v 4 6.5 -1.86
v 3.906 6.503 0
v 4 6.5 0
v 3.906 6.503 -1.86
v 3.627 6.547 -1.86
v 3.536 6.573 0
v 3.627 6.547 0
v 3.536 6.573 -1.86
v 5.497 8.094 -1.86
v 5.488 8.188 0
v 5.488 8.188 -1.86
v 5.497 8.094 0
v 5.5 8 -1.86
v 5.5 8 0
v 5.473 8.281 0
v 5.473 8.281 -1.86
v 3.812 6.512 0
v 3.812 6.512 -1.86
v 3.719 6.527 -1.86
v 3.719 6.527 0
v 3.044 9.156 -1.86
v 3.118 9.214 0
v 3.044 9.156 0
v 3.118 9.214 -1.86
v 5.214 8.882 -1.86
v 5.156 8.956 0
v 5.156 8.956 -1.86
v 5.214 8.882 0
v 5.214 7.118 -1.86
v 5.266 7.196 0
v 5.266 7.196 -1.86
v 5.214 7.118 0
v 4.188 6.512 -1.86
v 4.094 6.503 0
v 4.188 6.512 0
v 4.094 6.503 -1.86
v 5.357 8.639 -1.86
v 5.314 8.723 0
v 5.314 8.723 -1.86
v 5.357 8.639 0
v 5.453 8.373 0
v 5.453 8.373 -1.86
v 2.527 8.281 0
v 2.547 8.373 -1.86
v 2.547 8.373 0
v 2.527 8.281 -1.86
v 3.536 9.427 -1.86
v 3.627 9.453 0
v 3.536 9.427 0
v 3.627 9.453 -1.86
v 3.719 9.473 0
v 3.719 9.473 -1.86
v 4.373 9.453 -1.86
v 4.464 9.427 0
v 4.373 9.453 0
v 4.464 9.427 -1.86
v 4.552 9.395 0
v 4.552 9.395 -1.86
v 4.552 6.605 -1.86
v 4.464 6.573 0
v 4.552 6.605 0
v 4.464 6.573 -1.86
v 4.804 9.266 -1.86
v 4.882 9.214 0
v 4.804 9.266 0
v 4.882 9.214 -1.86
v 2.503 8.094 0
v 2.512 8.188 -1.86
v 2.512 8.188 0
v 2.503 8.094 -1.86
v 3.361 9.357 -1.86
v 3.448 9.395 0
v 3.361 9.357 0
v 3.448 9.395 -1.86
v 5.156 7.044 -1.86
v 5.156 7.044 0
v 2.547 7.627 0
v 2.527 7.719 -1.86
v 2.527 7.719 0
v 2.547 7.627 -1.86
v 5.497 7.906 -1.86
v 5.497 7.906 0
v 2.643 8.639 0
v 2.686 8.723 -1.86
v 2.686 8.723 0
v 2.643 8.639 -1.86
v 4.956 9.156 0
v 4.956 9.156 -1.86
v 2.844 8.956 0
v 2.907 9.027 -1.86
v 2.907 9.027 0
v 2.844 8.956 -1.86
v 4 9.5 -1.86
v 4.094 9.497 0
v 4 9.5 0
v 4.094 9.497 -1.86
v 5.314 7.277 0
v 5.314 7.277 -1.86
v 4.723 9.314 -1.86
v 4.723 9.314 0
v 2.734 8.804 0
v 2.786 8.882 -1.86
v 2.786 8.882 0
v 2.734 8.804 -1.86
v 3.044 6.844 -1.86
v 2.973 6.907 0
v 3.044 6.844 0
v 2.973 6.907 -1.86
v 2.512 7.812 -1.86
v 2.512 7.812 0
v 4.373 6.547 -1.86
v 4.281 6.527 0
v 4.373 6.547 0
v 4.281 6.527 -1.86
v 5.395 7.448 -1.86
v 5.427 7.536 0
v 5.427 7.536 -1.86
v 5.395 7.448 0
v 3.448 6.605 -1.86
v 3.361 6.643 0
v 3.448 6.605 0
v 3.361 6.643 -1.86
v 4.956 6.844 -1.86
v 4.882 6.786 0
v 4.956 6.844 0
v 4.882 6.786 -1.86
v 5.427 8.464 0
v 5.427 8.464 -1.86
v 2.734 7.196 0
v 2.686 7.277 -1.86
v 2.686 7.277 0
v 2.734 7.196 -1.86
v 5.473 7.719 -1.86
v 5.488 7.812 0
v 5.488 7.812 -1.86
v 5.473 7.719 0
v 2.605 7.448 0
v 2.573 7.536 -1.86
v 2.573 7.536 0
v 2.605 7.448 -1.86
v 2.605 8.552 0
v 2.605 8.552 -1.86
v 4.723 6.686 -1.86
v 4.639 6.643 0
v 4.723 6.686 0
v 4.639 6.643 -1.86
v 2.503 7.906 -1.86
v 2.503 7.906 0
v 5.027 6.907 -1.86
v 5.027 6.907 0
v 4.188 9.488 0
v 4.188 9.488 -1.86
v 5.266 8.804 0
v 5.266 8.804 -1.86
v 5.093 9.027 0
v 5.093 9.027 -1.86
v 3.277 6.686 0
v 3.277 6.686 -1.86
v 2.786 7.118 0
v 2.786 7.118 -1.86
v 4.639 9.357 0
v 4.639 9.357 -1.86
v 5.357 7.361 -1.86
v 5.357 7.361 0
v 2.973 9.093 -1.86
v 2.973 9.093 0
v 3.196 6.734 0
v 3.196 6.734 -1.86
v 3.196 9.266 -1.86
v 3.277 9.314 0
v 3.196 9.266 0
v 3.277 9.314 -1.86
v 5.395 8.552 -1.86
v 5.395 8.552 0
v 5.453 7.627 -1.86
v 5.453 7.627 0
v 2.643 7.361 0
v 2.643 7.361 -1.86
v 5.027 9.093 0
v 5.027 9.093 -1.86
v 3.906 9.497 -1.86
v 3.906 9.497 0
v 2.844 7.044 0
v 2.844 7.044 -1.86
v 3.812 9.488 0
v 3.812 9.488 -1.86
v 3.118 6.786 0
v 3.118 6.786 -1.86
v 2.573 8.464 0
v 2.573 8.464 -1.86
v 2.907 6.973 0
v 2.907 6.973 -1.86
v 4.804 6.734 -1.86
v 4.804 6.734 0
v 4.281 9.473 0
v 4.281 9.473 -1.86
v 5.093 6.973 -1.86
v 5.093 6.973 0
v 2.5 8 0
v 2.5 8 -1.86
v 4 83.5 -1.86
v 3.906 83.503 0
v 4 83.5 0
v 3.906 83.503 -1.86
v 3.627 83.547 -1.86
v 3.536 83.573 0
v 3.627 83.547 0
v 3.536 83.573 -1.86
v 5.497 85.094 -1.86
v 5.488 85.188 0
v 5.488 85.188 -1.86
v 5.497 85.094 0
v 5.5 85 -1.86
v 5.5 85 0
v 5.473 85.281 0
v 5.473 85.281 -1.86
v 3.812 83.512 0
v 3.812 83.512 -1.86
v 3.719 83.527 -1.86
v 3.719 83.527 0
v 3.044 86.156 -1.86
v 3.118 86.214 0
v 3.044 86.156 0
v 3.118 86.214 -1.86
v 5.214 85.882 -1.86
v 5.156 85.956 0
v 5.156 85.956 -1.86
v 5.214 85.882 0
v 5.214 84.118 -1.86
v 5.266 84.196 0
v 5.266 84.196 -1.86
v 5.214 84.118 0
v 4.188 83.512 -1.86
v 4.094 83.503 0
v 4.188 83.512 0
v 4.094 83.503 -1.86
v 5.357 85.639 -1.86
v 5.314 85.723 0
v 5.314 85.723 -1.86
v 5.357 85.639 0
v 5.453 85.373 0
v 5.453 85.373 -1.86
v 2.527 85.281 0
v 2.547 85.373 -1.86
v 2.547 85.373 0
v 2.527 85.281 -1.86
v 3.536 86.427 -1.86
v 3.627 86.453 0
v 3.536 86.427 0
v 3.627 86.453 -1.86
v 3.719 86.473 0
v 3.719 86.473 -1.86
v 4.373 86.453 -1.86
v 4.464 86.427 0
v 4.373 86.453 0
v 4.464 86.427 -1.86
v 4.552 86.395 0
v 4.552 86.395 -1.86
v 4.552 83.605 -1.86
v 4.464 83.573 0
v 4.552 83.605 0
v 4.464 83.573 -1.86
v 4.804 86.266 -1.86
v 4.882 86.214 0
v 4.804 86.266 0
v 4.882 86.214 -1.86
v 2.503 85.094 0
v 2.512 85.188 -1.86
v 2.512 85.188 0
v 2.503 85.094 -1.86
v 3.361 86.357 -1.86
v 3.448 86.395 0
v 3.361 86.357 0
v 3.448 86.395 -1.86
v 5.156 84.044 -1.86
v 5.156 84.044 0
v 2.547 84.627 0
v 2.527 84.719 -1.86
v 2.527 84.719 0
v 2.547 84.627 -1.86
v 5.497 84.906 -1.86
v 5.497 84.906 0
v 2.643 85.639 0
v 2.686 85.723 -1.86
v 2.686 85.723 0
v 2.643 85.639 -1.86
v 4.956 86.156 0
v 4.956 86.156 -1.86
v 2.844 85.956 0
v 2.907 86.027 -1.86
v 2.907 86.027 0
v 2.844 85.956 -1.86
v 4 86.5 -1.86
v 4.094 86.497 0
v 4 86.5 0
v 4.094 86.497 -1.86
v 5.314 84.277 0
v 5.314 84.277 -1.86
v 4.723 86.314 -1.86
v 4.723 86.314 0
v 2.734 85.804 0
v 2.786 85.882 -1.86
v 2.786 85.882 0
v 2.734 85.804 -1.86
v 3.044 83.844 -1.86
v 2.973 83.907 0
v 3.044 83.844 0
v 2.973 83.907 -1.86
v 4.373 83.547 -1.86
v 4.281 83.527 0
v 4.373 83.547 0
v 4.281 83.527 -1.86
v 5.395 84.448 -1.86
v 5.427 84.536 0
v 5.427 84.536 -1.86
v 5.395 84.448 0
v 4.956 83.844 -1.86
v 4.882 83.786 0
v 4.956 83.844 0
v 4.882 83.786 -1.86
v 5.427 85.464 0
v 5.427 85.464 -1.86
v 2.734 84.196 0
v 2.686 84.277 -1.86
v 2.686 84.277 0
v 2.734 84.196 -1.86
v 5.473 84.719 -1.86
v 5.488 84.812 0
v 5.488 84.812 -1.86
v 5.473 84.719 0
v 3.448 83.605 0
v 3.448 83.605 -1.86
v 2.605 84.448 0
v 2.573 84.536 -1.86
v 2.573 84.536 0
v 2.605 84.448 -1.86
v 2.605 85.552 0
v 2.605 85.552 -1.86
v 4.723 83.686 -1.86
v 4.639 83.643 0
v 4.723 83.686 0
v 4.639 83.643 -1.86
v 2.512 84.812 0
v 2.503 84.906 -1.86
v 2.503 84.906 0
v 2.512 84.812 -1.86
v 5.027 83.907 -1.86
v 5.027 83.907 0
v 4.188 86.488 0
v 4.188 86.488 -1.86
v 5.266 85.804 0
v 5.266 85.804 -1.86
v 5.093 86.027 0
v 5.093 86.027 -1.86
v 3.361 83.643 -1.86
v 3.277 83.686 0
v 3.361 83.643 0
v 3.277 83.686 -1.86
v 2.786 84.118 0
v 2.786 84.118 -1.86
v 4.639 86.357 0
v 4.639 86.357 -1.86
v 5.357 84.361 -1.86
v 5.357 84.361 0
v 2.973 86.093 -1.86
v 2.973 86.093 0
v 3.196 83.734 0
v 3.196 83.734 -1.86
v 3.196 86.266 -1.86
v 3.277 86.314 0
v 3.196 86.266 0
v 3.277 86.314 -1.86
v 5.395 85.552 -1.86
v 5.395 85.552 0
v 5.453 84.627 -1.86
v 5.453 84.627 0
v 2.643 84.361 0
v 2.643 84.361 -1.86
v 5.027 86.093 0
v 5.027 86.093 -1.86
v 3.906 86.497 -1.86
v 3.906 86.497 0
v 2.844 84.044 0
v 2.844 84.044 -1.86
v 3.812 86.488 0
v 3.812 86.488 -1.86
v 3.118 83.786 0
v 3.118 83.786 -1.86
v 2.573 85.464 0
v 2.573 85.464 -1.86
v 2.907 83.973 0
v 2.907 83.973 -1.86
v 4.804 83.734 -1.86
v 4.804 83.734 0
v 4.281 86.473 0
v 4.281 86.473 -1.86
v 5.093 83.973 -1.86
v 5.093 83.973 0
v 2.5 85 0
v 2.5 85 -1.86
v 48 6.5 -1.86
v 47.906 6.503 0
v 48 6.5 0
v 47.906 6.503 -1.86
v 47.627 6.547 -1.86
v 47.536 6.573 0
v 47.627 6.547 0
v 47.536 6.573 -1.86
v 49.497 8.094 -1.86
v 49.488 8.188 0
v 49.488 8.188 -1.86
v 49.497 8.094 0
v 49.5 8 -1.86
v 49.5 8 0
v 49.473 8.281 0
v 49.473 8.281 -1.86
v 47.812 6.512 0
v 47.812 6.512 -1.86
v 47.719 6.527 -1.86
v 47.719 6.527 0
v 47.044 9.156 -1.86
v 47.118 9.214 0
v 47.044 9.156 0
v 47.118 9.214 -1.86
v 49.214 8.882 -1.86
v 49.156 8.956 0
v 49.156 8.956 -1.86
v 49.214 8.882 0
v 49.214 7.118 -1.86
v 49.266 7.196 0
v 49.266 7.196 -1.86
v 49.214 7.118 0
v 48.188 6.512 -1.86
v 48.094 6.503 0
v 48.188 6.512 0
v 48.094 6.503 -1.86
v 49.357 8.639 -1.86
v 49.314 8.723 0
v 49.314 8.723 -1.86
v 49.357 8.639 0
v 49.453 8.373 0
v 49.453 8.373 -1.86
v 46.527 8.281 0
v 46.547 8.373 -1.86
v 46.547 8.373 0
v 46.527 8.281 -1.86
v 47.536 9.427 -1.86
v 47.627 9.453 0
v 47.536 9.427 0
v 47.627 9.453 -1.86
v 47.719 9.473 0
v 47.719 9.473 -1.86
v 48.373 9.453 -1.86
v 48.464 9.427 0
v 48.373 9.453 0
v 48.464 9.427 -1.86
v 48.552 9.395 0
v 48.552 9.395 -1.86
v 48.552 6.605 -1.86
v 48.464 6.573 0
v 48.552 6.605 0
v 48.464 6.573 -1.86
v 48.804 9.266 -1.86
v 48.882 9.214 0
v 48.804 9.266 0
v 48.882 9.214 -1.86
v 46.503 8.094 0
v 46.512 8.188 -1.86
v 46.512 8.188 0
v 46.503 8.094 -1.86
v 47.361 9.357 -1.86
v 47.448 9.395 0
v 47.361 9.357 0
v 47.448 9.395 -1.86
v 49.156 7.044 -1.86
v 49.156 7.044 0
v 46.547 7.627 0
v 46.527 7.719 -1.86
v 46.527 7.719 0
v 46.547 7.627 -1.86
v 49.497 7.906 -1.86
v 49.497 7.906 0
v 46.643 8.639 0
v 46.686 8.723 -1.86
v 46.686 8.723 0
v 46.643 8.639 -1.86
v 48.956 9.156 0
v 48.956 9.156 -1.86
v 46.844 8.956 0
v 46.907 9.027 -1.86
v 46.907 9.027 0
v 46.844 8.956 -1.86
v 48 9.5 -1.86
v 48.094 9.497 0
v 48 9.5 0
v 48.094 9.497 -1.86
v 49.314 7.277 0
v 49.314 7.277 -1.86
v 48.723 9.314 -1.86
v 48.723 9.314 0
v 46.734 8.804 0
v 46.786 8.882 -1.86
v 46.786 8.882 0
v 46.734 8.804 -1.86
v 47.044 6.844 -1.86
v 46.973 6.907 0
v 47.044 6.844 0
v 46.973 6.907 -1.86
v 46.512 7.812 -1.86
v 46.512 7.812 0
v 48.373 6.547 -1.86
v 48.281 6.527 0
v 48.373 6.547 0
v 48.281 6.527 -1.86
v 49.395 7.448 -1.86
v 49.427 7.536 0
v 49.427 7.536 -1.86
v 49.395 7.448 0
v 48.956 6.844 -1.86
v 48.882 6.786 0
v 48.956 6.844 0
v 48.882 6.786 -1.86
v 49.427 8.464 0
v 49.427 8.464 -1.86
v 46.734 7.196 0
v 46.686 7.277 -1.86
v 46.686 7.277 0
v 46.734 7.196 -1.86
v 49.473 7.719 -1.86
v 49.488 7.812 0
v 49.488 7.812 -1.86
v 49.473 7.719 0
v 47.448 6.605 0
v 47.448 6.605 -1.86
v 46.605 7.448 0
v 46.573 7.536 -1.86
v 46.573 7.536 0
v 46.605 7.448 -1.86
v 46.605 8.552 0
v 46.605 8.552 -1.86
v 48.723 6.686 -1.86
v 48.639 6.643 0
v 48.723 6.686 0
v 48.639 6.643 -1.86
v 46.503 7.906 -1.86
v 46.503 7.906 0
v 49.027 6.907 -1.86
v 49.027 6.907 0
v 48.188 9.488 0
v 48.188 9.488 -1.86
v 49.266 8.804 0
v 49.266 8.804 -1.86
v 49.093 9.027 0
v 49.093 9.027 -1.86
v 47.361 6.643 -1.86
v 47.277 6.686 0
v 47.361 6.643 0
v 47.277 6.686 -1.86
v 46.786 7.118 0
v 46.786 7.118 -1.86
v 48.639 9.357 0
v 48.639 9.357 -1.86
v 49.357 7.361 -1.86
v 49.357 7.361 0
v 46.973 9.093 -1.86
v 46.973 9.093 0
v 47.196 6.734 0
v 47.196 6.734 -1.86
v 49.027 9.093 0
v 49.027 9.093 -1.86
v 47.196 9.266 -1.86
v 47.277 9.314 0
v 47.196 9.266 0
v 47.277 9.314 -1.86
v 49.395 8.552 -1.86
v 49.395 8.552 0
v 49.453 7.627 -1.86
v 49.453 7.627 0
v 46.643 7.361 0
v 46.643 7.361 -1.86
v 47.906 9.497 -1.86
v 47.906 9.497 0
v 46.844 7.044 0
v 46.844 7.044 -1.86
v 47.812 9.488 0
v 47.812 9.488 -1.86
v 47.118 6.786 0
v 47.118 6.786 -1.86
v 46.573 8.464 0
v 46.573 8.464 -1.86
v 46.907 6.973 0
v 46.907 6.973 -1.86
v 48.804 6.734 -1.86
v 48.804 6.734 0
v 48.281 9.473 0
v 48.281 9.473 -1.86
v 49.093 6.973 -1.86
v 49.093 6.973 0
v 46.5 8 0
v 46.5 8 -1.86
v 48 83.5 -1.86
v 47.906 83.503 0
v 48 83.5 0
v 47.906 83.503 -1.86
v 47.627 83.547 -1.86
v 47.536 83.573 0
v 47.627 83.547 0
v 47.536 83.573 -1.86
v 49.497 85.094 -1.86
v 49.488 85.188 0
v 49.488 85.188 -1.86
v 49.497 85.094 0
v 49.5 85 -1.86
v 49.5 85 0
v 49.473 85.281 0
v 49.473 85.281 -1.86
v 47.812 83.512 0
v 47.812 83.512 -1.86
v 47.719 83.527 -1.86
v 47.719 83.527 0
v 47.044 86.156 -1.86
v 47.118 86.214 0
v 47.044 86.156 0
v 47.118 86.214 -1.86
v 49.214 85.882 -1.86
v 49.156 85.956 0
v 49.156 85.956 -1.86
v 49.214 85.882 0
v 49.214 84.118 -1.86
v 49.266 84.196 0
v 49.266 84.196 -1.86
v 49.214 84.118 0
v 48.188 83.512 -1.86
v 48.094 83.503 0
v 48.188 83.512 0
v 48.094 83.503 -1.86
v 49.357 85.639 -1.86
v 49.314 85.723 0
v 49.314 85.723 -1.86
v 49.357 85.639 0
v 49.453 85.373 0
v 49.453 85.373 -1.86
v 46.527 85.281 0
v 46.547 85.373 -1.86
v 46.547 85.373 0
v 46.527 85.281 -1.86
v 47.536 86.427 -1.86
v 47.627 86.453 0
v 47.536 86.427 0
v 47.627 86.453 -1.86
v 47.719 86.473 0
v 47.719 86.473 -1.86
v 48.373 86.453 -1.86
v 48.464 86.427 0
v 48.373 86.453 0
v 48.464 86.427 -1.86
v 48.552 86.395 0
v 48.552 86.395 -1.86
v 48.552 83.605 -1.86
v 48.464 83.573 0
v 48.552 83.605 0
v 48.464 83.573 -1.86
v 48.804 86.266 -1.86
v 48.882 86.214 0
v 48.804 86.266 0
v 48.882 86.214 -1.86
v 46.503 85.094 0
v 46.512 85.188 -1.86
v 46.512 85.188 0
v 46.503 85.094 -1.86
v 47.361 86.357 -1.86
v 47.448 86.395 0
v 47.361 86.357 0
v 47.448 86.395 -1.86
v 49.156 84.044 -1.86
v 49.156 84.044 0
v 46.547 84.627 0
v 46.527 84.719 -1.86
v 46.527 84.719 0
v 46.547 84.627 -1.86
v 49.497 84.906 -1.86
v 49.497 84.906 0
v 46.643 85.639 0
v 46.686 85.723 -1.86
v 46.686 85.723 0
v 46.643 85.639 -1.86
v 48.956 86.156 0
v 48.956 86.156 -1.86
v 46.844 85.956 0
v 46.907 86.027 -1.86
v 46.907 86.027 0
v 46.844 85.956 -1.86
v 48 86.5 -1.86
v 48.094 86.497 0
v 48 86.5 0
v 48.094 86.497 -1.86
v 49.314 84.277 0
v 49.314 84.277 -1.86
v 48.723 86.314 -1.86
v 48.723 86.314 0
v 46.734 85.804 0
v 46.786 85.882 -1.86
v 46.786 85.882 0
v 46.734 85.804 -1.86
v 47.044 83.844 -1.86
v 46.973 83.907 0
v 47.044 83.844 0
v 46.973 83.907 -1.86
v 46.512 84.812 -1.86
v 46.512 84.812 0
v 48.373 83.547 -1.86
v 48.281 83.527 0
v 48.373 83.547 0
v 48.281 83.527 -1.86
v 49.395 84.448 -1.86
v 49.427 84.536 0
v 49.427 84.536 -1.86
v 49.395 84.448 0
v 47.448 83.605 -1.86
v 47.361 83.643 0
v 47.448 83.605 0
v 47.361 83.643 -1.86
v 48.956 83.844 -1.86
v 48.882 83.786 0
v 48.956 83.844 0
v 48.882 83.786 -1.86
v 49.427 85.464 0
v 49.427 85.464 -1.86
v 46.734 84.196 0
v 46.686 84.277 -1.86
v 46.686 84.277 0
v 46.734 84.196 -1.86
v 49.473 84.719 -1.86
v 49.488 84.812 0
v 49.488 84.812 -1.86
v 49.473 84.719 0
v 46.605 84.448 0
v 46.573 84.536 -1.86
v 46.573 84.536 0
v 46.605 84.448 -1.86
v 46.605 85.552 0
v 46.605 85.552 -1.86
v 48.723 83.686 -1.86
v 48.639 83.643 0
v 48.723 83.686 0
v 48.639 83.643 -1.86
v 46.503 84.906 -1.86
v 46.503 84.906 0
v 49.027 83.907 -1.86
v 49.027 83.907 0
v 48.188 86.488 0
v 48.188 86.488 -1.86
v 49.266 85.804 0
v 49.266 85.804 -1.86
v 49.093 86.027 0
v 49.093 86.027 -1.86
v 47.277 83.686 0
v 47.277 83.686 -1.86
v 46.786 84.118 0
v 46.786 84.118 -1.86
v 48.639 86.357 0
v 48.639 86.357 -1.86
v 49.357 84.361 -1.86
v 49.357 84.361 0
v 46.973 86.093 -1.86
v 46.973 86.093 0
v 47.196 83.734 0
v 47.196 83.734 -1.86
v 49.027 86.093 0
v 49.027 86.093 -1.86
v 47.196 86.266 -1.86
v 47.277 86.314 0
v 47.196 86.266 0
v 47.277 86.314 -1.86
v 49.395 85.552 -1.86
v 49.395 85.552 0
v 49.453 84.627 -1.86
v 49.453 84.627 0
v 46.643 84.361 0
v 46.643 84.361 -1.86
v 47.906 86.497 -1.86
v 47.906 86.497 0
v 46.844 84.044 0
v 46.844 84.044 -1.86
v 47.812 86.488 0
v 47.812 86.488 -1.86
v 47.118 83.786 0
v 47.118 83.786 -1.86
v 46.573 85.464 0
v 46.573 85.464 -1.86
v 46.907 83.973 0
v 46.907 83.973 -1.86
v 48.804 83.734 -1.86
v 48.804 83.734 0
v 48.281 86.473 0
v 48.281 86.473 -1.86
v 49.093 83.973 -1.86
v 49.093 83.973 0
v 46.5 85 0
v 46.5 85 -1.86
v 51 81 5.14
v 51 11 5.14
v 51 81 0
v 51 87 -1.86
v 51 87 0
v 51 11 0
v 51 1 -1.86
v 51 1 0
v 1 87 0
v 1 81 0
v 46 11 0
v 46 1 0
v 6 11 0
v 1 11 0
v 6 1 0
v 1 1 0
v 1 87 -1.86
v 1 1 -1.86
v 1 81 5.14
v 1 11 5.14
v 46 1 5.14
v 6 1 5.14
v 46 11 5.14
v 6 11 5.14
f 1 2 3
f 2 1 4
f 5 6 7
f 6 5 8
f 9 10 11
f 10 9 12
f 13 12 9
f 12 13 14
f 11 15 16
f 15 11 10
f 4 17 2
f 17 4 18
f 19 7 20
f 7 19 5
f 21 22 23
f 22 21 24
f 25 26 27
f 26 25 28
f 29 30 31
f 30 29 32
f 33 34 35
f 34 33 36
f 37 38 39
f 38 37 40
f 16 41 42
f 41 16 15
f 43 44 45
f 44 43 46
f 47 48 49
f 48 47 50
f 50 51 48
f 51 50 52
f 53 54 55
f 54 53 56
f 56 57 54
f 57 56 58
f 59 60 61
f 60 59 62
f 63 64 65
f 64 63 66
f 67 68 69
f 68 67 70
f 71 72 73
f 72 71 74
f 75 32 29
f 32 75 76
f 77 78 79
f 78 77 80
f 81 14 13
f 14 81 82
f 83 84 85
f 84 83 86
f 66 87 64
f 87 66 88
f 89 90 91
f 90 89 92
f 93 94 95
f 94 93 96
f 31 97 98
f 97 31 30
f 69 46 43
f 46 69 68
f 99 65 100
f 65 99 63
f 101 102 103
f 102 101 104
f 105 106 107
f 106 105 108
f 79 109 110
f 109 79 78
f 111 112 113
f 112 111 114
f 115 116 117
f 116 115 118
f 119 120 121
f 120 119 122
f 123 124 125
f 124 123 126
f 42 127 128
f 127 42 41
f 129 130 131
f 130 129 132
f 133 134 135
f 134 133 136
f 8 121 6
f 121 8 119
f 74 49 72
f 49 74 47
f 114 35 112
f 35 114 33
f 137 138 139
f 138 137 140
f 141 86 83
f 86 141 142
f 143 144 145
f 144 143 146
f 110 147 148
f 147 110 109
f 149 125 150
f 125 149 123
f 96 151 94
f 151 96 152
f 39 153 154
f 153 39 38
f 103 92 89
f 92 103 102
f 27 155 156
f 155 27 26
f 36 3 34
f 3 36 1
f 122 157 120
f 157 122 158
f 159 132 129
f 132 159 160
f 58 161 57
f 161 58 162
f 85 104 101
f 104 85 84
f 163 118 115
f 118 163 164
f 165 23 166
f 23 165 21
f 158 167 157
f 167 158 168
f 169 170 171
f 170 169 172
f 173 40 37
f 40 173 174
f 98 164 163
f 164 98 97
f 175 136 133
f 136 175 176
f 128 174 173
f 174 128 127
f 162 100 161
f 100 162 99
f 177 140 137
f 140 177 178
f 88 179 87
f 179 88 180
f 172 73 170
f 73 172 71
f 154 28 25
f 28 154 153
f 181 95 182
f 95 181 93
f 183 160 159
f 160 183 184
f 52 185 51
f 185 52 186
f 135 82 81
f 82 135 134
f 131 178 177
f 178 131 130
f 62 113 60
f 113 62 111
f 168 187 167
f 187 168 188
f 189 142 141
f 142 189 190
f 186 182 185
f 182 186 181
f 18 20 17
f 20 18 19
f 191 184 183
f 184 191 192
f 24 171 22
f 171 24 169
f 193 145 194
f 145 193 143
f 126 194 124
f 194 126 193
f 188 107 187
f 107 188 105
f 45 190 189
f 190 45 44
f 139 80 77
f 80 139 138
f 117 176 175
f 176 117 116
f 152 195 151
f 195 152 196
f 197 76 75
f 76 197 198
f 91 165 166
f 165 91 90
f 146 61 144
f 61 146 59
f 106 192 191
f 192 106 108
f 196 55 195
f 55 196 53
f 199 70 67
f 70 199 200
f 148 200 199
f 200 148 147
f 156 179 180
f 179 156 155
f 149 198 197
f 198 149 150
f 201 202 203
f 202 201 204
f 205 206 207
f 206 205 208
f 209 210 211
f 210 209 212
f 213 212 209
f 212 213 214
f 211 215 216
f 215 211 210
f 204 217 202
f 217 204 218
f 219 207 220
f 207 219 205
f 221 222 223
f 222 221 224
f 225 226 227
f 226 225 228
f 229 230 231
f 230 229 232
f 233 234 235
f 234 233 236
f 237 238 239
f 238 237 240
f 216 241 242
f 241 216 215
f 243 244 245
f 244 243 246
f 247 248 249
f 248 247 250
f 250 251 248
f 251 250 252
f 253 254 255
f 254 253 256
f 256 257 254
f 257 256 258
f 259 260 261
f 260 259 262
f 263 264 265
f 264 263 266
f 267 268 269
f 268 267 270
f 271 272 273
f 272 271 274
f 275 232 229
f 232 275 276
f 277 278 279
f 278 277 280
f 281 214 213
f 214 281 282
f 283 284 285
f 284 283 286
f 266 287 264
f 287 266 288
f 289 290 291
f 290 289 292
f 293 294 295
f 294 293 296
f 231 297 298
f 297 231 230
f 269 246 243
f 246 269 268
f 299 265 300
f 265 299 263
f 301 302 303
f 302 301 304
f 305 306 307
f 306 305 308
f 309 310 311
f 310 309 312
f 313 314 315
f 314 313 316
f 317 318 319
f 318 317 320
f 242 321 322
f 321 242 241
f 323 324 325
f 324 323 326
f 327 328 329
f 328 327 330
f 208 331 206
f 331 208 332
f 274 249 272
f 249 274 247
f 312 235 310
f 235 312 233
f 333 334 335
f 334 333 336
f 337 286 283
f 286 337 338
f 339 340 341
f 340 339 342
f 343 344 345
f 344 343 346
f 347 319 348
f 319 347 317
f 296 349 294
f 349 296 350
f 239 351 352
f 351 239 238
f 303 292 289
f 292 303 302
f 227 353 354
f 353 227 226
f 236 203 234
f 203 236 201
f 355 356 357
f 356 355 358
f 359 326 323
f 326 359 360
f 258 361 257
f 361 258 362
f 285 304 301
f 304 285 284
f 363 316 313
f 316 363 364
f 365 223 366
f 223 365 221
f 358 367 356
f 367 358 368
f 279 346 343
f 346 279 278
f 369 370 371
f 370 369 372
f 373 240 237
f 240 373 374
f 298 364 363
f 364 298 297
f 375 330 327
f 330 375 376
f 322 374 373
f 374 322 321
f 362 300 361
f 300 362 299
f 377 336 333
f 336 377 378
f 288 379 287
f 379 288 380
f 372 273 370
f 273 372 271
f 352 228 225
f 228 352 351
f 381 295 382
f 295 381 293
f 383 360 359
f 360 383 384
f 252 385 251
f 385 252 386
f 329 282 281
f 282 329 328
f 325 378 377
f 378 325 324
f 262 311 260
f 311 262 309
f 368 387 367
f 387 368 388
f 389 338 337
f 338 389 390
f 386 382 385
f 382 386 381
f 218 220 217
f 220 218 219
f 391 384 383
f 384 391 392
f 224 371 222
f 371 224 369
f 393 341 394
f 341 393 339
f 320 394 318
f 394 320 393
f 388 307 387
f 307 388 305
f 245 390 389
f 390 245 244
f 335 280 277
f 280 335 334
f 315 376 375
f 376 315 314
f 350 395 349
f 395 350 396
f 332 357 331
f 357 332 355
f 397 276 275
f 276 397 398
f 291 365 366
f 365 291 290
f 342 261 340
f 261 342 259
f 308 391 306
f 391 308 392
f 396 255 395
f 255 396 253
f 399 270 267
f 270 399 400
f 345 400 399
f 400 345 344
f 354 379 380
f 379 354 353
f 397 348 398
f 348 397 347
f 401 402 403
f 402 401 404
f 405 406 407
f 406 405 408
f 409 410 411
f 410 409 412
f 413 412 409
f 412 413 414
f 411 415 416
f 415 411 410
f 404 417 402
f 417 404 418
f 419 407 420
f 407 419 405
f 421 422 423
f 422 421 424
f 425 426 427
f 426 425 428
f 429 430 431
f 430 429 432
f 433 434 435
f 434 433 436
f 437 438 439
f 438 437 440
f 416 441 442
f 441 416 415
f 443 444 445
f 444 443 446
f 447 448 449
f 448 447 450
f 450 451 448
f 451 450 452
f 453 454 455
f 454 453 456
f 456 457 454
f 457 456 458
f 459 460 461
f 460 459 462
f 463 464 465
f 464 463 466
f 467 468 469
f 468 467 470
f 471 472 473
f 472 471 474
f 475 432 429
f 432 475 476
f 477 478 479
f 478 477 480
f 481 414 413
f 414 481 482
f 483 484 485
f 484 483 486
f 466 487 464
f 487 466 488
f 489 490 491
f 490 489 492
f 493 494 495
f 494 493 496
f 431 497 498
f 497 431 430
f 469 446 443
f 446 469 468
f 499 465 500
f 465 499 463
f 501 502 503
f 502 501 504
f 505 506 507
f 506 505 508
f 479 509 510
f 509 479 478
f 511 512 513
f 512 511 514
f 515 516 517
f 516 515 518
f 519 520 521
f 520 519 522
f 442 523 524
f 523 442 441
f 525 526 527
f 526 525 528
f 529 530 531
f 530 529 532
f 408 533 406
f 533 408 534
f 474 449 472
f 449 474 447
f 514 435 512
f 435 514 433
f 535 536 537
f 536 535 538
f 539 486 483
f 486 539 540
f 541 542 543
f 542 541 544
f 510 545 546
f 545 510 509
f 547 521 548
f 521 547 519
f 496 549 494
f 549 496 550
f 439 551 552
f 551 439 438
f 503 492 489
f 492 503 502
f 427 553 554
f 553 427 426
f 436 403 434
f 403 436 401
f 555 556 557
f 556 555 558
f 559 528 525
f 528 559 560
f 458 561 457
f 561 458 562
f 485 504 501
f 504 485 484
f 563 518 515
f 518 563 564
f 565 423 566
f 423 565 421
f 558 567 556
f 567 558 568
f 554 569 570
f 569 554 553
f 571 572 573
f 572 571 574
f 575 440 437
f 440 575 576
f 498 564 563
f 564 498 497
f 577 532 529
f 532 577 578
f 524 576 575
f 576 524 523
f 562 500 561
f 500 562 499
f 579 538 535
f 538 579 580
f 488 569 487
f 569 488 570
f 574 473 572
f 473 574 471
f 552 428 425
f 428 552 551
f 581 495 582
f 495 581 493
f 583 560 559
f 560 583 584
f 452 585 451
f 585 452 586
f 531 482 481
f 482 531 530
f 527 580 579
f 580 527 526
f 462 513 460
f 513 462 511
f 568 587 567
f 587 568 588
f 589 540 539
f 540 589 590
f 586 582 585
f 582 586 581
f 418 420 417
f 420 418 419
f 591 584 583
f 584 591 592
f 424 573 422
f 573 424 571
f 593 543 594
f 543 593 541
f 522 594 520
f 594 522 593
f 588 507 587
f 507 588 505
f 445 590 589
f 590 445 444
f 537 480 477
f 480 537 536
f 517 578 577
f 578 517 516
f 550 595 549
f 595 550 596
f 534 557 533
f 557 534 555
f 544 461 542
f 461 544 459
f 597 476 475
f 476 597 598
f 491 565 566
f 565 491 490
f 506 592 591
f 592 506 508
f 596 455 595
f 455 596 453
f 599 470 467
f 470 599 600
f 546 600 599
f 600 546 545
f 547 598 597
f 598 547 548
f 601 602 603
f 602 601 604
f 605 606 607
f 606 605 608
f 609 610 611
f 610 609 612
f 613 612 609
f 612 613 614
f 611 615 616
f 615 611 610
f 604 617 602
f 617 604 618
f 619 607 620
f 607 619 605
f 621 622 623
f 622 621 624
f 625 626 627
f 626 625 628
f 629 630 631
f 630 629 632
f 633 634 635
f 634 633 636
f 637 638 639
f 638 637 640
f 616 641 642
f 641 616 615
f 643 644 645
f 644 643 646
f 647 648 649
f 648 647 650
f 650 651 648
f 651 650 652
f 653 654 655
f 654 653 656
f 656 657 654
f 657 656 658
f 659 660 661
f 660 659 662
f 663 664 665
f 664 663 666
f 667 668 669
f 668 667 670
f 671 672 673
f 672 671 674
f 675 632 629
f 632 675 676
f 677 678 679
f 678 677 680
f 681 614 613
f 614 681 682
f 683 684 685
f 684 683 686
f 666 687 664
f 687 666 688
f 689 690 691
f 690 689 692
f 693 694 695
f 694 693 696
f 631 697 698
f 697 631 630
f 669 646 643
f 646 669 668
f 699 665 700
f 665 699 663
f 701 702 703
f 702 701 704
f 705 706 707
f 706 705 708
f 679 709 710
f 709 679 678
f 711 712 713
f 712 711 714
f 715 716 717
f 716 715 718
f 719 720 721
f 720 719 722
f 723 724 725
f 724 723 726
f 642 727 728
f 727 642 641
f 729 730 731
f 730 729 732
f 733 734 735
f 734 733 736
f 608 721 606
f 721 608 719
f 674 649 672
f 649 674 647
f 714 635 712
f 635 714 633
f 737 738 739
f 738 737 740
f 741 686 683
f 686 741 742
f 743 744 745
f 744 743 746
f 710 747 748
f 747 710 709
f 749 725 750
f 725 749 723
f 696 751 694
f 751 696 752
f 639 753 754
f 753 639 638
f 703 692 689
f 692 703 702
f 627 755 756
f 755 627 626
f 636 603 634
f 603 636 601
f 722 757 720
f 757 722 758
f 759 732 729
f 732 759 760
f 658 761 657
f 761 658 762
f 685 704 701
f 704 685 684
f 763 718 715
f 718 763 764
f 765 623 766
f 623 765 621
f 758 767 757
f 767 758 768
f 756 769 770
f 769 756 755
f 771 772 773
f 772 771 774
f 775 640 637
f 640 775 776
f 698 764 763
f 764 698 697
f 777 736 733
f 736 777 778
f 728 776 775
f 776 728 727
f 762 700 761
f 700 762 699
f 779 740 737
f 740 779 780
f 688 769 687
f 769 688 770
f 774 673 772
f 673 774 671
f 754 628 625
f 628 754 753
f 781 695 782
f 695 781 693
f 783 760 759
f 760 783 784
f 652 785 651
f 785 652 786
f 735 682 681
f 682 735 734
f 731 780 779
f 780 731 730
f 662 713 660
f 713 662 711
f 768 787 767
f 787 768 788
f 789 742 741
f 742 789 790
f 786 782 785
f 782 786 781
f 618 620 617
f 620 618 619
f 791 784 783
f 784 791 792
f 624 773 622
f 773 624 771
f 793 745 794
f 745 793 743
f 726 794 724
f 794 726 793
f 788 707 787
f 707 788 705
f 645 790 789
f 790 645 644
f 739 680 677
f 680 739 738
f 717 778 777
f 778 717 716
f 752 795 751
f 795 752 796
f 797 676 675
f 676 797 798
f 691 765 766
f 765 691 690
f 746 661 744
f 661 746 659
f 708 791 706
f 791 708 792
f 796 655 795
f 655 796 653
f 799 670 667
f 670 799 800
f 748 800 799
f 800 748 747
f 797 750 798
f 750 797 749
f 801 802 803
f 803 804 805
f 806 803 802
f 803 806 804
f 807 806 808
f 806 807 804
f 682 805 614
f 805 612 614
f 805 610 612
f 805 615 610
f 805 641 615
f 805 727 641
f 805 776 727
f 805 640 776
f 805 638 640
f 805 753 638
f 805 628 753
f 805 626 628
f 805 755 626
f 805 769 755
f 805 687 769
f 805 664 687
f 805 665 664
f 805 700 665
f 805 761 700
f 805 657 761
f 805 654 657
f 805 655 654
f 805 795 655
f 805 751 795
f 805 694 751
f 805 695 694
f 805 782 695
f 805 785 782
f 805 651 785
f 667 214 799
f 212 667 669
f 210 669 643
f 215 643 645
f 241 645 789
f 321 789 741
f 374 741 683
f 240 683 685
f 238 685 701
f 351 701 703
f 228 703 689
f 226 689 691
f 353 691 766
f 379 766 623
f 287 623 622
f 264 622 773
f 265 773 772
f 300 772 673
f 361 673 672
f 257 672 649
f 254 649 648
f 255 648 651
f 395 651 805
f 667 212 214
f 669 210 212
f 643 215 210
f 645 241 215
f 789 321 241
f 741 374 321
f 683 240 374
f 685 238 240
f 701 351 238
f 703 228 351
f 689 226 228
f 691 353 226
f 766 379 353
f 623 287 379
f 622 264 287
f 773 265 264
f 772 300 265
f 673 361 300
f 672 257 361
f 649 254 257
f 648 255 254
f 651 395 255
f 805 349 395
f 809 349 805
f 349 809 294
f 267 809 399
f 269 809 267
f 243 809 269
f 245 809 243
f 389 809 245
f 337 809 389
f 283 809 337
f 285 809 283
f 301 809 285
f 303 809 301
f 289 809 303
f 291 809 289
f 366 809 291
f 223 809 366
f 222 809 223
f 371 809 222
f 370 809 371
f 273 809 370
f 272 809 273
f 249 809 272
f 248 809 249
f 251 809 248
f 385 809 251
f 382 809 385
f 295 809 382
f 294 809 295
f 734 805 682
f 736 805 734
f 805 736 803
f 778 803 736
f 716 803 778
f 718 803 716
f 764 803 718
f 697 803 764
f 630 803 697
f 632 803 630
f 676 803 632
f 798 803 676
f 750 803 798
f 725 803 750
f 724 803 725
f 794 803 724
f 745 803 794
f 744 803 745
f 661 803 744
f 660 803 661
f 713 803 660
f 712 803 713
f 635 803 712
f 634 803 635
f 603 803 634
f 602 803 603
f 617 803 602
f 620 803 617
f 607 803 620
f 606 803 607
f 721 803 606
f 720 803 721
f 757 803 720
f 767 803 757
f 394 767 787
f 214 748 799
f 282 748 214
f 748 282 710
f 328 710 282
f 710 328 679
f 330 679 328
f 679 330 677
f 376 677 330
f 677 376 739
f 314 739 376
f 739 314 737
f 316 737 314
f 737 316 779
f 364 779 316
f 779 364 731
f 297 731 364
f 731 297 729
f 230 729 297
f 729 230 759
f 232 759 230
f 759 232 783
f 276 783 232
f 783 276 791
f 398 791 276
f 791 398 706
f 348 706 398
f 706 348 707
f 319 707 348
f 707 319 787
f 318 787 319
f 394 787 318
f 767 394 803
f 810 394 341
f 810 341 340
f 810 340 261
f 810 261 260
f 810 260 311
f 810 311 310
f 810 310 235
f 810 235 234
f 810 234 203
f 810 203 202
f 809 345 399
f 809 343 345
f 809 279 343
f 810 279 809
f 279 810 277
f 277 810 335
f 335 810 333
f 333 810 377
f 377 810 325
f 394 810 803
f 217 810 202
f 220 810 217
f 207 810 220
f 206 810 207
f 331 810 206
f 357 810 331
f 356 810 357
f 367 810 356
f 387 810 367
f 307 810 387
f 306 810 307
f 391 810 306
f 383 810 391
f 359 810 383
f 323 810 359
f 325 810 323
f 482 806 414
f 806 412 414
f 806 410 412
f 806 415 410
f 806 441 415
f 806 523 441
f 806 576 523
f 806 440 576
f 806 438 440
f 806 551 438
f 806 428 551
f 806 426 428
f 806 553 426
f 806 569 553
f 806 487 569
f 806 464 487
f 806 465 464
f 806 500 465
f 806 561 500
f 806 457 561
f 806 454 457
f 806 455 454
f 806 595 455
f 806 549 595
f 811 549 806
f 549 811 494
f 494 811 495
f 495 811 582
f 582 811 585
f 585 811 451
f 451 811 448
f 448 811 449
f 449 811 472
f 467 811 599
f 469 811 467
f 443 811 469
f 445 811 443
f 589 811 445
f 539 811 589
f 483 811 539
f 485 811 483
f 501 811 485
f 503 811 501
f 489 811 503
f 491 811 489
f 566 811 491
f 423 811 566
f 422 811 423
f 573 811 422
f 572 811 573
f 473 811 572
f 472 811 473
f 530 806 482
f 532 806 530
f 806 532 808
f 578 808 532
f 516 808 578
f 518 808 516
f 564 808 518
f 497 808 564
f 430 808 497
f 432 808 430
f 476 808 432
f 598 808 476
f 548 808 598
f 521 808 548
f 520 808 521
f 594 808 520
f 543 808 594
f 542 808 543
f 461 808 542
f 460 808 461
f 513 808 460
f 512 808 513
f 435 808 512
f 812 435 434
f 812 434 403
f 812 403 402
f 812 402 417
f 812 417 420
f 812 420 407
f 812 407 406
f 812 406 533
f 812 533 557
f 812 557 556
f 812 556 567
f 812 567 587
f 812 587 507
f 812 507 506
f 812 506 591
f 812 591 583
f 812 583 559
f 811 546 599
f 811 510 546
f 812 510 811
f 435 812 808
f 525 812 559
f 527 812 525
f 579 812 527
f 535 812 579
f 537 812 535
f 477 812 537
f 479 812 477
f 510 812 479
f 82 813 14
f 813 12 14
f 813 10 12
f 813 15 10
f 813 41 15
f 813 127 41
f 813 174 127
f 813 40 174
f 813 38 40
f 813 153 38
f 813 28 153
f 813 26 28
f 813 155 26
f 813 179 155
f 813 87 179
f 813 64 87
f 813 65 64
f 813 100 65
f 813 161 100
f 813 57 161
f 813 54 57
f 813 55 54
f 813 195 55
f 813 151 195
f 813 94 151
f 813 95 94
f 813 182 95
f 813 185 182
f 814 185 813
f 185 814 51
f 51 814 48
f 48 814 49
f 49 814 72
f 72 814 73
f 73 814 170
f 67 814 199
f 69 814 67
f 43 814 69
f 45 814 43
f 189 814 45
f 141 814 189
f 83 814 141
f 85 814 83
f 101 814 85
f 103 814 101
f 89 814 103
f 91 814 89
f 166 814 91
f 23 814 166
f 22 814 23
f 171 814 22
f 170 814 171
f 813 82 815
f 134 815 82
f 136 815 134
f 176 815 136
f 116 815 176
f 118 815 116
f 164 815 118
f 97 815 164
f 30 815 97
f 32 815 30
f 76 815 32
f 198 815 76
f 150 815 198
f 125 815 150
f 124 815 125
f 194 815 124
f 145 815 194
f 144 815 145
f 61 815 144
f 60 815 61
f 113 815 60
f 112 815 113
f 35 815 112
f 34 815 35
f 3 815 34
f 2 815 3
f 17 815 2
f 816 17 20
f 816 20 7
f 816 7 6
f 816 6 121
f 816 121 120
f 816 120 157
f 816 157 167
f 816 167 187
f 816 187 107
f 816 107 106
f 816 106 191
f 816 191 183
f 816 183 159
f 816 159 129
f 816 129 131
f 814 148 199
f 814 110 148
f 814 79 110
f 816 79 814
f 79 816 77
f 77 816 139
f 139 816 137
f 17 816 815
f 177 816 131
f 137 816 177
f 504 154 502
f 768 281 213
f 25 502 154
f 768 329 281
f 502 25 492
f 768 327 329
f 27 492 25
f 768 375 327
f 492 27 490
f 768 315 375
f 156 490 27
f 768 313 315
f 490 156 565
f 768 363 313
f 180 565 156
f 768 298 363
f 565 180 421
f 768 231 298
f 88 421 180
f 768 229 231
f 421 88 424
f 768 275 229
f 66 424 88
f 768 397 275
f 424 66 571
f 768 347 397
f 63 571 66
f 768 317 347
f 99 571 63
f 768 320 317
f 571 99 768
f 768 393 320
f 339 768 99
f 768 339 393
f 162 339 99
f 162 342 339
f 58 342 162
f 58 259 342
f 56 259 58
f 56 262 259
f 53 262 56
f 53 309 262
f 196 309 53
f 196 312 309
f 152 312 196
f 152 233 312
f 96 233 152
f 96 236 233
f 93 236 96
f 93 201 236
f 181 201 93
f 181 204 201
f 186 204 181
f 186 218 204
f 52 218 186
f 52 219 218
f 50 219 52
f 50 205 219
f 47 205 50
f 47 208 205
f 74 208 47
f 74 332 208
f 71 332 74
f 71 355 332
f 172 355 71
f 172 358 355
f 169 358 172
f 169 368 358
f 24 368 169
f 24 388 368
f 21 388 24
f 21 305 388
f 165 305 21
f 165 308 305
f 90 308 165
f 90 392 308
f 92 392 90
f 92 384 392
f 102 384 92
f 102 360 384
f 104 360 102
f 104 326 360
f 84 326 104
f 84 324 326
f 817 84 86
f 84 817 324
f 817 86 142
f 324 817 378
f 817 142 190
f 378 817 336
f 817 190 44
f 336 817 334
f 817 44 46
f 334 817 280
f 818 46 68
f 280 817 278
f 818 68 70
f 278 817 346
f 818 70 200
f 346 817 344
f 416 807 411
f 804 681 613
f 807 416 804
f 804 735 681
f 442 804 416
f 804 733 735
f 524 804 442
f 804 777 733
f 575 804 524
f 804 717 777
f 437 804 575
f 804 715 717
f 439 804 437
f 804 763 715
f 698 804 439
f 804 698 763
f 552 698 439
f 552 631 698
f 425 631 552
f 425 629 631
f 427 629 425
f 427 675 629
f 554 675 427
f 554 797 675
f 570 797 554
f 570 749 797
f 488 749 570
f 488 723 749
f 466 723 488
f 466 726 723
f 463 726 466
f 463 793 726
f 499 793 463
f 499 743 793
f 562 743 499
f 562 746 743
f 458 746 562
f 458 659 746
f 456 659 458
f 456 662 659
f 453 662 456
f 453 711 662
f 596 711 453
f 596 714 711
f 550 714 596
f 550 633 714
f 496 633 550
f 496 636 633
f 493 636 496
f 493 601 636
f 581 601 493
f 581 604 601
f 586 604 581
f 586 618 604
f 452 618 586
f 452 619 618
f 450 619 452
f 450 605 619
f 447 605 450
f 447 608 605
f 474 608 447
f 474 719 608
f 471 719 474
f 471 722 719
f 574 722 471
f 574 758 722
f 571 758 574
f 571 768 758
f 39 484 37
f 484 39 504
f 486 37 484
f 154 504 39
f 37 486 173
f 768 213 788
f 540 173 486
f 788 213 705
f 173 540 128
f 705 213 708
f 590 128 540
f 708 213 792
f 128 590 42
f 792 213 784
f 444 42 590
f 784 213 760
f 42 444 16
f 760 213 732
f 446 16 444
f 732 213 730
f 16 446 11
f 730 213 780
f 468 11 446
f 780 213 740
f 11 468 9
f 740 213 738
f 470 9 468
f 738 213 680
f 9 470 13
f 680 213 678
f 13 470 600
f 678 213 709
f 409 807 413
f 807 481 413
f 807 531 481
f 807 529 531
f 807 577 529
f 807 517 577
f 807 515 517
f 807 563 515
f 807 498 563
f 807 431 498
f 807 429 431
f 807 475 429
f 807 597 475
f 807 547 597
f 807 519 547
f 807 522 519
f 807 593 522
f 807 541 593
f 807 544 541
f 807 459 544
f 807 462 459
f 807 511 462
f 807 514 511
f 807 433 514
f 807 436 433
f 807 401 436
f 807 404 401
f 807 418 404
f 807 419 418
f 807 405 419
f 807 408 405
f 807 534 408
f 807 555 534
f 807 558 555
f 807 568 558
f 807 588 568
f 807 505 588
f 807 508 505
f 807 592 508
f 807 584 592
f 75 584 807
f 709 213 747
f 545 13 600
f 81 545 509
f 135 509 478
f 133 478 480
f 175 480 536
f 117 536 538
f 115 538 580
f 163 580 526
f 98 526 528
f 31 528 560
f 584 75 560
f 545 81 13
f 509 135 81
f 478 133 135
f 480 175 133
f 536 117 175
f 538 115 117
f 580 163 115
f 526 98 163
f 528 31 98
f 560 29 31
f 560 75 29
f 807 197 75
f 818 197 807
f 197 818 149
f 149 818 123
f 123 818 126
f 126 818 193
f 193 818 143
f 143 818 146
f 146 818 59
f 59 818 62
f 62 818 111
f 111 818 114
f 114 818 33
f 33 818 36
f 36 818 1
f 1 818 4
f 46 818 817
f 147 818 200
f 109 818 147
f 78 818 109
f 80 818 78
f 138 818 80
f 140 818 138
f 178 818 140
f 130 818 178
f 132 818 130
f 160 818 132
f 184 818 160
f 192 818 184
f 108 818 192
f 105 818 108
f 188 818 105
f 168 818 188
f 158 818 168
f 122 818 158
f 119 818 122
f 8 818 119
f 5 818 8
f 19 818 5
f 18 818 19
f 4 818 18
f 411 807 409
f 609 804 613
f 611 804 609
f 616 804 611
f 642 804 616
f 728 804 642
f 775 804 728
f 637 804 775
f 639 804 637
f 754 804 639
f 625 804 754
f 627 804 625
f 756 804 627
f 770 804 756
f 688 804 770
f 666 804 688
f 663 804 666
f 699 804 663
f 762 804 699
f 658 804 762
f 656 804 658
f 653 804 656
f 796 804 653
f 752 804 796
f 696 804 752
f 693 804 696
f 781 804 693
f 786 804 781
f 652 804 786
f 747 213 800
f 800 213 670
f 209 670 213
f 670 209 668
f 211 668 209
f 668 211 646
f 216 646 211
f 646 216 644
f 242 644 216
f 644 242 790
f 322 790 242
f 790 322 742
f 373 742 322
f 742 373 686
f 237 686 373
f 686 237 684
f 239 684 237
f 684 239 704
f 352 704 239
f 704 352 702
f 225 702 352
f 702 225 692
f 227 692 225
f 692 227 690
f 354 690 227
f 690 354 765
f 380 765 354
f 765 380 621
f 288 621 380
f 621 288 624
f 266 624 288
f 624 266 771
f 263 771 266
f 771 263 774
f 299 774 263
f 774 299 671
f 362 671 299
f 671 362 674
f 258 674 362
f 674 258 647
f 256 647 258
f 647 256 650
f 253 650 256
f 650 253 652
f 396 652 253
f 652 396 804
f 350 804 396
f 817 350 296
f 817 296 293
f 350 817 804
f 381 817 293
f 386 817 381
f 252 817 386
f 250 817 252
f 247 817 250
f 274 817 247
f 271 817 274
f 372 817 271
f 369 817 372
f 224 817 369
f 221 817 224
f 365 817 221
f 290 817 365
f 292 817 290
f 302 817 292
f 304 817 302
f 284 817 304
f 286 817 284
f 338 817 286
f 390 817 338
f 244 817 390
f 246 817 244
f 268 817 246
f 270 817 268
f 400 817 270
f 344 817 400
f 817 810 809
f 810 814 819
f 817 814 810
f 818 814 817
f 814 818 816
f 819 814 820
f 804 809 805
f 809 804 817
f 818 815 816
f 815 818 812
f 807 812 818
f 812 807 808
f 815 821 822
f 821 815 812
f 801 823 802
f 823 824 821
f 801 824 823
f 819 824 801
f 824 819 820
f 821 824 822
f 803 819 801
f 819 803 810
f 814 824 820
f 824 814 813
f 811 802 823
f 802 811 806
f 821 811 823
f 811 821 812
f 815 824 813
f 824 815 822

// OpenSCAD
$fn=100;

tft_pcb_thickness = 1.86;
module tft_mounting_hole(nx,ny)
{
    x = nx == 0? 3: 47;
    y = ny == 0? 7: 84;
    translate([x,y,0])
        children(0);
}
module tftbore()
{
    cylinder(10,d=3,center=true);
}
module mountbore(l=40)
{
    translate([0,0,0])
    cylinder(l,d=2.7,center=true);
}
module tft(aperture_drill=0)
{
    pcb_y = 86;
    pcb_x = 50;
    difference()
    {
        translate([0,0,-aperture_drill])
        cube([pcb_x, pcb_y, tft_pcb_thickness+aperture_drill]);
        if (aperture_drill==0)
        {
            for(i=[[0,0],[0,1],[1,0],[1,1]])
            {
                tft_mounting_hole(i[0], i[1])
                    tftbore();
            }
        }
    }

    //tft
    tft_y=70;
    tft_z = 7;
    border = 3;
    translate([0,10, tft_pcb_thickness])
        cube([pcb_x,tft_y, tft_z-tft_pcb_thickness]);

    translate([5,0, tft_pcb_thickness])
        cube([pcb_x-10,tft_y, tft_z-tft_pcb_thickness]);

    translate([border, border+15, tft_pcb_thickness])
        cube([pcb_x-border*2,
            tft_y-border*2-5, 
            tft_z-tft_pcb_thickness+aperture_drill
        ]);
}

module tft_location()
{
    translate([1,1,-tft_pcb_thickness])
        children(0);

}
if(0)
difference()
{
    cube([55,90,6]);
    tft_location()
    union()
    {
        tft(100);

            for(i=[[0,0],[0,1],[1,0],[1,1]])
            {
                tft_mounting_hole(i[0], i[1])
                    mountbore(10);
            }
    }
}

if(1)
    tft_location()
    color("red")
    tft();
